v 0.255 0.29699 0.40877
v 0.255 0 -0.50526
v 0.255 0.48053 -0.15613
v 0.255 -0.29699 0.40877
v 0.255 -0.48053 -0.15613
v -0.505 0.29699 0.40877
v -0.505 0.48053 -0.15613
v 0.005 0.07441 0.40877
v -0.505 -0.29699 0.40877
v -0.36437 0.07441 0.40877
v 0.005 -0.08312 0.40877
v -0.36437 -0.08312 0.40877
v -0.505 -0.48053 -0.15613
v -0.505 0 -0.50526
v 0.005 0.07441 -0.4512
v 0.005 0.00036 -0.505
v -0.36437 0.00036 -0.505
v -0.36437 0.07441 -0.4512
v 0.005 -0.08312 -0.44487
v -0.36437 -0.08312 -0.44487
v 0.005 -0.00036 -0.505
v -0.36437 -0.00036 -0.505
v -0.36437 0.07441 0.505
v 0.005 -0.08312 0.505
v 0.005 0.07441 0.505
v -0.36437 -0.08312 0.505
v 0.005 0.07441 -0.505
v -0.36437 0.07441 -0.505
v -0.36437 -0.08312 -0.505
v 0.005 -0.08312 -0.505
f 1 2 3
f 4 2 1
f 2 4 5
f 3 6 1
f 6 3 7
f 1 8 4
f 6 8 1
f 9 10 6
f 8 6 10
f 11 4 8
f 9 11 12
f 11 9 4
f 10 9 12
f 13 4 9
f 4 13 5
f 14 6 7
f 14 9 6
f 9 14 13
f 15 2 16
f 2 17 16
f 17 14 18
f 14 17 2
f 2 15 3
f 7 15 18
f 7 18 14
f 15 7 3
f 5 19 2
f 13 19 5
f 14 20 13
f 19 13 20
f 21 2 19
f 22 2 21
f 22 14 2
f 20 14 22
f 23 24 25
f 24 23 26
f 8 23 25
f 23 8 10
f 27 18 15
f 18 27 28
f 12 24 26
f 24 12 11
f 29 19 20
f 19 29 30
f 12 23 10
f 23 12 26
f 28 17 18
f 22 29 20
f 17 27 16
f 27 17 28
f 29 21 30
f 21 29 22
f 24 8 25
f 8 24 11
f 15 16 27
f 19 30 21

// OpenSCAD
EPS = 0.01;

// Solid 0
translate([-0.5, 0, 0])
rotate([0, 90, 0])
translate([0, 0, 0.75/2])
cylinder(h=0.75 + EPS, r=0.5052631578947369, center=true);

// Solid 1 (cut from Solid 0)
translate([0, -0.078125, 0])
rotate([0, 0, 90])
translate([0.1475328947368421/2, 0.359375/2, 0])
difference() {
    cube([0.1475328947368421 + EPS, 0.359375 + EPS, 1.0 + EPS], center=true);
}

// Solid 2 (cut from Solid 0)
translate([-0.140625, 0, 0.1484375])
rotate([0, 90, 0])
translate([0, 0, 0.2734375/2])
difference() {
    cylinder(h=0.2734375 + EPS, r=0.1381578947368421, center=true);
}
